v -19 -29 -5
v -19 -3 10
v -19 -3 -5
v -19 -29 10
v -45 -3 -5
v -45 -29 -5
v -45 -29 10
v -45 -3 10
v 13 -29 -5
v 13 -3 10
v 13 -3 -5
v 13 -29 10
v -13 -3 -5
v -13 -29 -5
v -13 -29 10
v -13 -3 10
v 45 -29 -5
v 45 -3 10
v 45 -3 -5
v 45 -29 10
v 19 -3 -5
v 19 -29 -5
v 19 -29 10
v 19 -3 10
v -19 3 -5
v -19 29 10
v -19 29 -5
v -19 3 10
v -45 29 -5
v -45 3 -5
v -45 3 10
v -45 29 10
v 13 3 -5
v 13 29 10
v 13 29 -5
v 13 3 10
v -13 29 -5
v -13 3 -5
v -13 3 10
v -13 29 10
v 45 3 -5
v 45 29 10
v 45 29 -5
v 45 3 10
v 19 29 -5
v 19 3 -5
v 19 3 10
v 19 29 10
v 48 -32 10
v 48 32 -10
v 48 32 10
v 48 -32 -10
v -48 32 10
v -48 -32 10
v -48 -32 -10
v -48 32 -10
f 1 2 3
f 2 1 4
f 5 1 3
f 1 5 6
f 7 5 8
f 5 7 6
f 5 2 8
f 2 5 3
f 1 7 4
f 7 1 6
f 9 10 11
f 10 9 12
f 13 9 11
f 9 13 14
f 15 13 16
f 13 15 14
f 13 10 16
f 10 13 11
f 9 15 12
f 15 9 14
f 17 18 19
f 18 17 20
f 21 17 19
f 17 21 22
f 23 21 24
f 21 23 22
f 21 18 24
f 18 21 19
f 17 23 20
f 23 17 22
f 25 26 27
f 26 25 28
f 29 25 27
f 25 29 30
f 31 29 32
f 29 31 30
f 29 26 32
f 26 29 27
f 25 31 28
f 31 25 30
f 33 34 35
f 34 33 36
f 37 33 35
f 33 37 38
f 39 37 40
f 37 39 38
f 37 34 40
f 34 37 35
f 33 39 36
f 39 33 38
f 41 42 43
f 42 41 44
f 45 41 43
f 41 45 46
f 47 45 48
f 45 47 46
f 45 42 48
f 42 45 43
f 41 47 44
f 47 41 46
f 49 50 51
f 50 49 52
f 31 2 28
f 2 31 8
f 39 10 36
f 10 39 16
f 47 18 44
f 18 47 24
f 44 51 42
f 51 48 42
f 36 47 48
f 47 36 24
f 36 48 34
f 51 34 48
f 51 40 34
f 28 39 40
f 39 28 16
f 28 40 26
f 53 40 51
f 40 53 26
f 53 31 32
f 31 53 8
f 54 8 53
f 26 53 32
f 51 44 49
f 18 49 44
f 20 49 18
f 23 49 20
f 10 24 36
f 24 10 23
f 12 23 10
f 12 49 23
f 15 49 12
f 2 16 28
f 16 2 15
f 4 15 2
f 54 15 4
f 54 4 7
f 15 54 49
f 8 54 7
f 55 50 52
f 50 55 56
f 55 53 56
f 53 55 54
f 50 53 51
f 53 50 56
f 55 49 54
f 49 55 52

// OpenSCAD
$fn = 32;

// ----------------------------------------------------------------------
// Pocket plate 96 x 64 x 20
// 2 x 3 pockets 26 mm square, 15 mm deep
// ----------------------------------------------------------------------

// --- parameters (mm) ---
thickness = 20;  // plate thickness
floor_t = 5;     // material left under each pocket
pocket = 26;     // pocket side length
pitch_x = 32;    // pocket pitch along X
pitch_y = 32;    // pocket pitch along Y
cols = 3;        // pockets per row
rows = 2;        // rows of pockets

// --- derived feature positions (mm) ---
depth = thickness - floor_t;        // = 15   pocket depth, down to the floor
span_x = (cols - 1) * pitch_x;      // = 64   distance between outer pockets
span_y = (rows - 1) * pitch_y;      // = 32   distance between outer pocket rows
origin_x = -span_x / 2;             // = -32   X of the first pocket
origin_y = -span_y / 2;             // = -16   Y of the first pocket
plate = [span_x + pocket + 6, span_y + pocket + 6, thickness];  // = [96, 64, 20]   overall size: pockets plus 3 mm of wall on each side
feature_centers = [
  [origin_x + 0 * pitch_x, origin_y + 0 * pitch_y],
  [origin_x + 1 * pitch_x, origin_y + 0 * pitch_y],
  [origin_x + 2 * pitch_x, origin_y + 0 * pitch_y],
  [origin_x + 0 * pitch_x, origin_y + 1 * pitch_y],
  [origin_x + 1 * pitch_x, origin_y + 1 * pitch_y],
  [origin_x + 2 * pitch_x, origin_y + 1 * pitch_y]
];   // pocket centres, used verbatim by the cutter loop

// plate outline, then one pocket per centre in feature_centers
difference() {
  cube(plate, center = true);
  for (centre = feature_centers)
    translate([centre[0] - pocket / 2, centre[1] - pocket / 2, plate[2] / 2 - depth])
      cube([pocket, pocket, depth + 1]);  // centred on the declared pocket centre
}
